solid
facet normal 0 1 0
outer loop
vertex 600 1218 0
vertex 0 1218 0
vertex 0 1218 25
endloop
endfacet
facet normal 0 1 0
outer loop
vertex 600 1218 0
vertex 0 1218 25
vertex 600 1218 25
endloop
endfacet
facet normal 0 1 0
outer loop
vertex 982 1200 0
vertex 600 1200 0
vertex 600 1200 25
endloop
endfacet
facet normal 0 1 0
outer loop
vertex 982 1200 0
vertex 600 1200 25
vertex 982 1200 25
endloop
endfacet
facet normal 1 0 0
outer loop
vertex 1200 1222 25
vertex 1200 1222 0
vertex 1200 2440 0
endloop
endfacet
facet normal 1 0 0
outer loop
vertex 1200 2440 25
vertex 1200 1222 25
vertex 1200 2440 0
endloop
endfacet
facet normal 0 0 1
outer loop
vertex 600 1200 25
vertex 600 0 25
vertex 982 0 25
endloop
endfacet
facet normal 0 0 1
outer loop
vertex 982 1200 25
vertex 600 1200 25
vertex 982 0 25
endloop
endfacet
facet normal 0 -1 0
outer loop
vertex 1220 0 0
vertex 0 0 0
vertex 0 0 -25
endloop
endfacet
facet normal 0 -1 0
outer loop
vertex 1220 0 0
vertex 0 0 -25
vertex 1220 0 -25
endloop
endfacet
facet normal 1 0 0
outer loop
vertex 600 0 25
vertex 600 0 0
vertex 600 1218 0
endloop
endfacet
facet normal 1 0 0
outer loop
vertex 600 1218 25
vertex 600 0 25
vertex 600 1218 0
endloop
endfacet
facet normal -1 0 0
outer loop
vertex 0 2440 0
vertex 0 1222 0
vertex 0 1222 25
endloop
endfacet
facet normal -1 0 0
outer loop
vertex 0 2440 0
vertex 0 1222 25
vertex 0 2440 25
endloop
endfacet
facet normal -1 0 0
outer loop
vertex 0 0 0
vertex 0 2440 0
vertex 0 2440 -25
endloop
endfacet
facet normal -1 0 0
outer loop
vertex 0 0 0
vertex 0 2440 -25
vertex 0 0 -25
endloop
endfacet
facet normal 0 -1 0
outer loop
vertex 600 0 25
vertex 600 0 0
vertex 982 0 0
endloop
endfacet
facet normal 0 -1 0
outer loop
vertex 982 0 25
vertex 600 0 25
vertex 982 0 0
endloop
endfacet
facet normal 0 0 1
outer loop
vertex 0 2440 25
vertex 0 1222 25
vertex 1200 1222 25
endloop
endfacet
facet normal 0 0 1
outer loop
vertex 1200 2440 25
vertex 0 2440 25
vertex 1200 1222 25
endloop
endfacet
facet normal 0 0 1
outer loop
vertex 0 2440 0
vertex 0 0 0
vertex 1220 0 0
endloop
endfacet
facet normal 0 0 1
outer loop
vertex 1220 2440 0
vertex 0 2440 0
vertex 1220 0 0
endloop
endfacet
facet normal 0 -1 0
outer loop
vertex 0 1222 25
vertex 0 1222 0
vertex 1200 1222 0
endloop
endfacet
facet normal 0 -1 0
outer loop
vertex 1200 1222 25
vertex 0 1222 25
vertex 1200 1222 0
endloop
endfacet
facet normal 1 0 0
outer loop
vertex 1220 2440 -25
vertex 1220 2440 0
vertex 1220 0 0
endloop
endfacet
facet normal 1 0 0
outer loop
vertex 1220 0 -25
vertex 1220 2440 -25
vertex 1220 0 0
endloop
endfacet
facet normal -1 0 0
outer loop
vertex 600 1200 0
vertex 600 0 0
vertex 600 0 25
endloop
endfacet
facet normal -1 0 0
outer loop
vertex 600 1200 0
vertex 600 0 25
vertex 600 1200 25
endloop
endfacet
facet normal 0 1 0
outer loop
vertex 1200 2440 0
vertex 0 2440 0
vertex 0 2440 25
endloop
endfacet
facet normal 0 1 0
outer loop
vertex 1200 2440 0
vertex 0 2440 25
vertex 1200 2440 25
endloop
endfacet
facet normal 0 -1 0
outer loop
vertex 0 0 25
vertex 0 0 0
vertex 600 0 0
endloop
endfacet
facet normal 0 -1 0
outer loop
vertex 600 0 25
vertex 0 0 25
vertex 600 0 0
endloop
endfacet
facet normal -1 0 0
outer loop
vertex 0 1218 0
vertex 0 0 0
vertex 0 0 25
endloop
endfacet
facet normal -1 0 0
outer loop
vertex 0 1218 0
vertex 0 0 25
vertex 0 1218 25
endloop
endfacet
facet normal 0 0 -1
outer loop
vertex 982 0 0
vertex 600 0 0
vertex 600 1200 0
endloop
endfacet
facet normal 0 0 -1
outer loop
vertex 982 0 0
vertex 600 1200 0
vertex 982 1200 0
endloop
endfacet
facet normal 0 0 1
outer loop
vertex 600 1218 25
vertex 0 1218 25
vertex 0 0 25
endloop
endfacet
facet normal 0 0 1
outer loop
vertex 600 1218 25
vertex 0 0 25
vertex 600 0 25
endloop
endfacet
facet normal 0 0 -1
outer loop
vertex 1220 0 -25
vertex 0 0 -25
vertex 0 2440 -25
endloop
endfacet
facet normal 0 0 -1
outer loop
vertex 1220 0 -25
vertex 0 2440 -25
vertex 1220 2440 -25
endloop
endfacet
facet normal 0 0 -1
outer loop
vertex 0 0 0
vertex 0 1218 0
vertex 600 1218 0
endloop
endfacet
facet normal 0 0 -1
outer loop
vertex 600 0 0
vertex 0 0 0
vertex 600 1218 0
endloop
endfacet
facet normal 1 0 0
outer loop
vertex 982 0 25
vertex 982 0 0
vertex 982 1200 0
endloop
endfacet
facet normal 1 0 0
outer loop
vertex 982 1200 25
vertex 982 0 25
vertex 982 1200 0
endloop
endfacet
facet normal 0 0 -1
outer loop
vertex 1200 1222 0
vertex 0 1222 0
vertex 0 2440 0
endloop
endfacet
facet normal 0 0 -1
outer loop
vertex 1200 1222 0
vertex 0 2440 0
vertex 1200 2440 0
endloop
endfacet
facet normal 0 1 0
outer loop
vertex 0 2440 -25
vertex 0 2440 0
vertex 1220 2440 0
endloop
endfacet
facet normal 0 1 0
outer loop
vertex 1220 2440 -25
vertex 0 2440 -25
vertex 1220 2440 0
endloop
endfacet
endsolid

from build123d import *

# Parameters (mm, degrees)
F0_W     = 600
F0_H     = 1218
F1_DEPTH = 25
F2_W     = 1220
F2_H     = 2440
F3_DEPTH = 25
F4_W     = 1200
F4_H     = 1218
F5_DEPTH = 25
F6_W     = 382
F6_H     = 1200
F7_DEPTH = 25


with BuildPart() as f1:
    # F0 (on Top) → F1 (new body)
    with BuildSketch(Plane.XY):
        with Locations((300, 609)):
            Rectangle(F0_W, F0_H)
    extrude(amount=F1_DEPTH)


with BuildPart() as f3:
    # F2 (on face) → F3 (new body)
    with BuildSketch(Plane(origin=(0, 0, 0), x_dir=(1, 0, 0), z_dir=(0, 0, -1))):
        with Locations((610, -1220)):
            Rectangle(F2_W, F2_H)
    extrude(amount=F3_DEPTH)


with BuildPart() as f5:
    # F4 (on face) → F5 (new body)
    with BuildSketch(Plane.XY):
        with Locations((600, 1831)):
            Rectangle(F4_W, F4_H)
    extrude(amount=F5_DEPTH)


with BuildPart() as f7:
    # F6 (on face) → F7 (new body)
    with BuildSketch(Plane.XY):
        with Locations((791, 600)):
            Rectangle(F6_W, F6_H)
    extrude(amount=F7_DEPTH)


solid = Compound([f1.part, f3.part, f5.part, f7.part])
